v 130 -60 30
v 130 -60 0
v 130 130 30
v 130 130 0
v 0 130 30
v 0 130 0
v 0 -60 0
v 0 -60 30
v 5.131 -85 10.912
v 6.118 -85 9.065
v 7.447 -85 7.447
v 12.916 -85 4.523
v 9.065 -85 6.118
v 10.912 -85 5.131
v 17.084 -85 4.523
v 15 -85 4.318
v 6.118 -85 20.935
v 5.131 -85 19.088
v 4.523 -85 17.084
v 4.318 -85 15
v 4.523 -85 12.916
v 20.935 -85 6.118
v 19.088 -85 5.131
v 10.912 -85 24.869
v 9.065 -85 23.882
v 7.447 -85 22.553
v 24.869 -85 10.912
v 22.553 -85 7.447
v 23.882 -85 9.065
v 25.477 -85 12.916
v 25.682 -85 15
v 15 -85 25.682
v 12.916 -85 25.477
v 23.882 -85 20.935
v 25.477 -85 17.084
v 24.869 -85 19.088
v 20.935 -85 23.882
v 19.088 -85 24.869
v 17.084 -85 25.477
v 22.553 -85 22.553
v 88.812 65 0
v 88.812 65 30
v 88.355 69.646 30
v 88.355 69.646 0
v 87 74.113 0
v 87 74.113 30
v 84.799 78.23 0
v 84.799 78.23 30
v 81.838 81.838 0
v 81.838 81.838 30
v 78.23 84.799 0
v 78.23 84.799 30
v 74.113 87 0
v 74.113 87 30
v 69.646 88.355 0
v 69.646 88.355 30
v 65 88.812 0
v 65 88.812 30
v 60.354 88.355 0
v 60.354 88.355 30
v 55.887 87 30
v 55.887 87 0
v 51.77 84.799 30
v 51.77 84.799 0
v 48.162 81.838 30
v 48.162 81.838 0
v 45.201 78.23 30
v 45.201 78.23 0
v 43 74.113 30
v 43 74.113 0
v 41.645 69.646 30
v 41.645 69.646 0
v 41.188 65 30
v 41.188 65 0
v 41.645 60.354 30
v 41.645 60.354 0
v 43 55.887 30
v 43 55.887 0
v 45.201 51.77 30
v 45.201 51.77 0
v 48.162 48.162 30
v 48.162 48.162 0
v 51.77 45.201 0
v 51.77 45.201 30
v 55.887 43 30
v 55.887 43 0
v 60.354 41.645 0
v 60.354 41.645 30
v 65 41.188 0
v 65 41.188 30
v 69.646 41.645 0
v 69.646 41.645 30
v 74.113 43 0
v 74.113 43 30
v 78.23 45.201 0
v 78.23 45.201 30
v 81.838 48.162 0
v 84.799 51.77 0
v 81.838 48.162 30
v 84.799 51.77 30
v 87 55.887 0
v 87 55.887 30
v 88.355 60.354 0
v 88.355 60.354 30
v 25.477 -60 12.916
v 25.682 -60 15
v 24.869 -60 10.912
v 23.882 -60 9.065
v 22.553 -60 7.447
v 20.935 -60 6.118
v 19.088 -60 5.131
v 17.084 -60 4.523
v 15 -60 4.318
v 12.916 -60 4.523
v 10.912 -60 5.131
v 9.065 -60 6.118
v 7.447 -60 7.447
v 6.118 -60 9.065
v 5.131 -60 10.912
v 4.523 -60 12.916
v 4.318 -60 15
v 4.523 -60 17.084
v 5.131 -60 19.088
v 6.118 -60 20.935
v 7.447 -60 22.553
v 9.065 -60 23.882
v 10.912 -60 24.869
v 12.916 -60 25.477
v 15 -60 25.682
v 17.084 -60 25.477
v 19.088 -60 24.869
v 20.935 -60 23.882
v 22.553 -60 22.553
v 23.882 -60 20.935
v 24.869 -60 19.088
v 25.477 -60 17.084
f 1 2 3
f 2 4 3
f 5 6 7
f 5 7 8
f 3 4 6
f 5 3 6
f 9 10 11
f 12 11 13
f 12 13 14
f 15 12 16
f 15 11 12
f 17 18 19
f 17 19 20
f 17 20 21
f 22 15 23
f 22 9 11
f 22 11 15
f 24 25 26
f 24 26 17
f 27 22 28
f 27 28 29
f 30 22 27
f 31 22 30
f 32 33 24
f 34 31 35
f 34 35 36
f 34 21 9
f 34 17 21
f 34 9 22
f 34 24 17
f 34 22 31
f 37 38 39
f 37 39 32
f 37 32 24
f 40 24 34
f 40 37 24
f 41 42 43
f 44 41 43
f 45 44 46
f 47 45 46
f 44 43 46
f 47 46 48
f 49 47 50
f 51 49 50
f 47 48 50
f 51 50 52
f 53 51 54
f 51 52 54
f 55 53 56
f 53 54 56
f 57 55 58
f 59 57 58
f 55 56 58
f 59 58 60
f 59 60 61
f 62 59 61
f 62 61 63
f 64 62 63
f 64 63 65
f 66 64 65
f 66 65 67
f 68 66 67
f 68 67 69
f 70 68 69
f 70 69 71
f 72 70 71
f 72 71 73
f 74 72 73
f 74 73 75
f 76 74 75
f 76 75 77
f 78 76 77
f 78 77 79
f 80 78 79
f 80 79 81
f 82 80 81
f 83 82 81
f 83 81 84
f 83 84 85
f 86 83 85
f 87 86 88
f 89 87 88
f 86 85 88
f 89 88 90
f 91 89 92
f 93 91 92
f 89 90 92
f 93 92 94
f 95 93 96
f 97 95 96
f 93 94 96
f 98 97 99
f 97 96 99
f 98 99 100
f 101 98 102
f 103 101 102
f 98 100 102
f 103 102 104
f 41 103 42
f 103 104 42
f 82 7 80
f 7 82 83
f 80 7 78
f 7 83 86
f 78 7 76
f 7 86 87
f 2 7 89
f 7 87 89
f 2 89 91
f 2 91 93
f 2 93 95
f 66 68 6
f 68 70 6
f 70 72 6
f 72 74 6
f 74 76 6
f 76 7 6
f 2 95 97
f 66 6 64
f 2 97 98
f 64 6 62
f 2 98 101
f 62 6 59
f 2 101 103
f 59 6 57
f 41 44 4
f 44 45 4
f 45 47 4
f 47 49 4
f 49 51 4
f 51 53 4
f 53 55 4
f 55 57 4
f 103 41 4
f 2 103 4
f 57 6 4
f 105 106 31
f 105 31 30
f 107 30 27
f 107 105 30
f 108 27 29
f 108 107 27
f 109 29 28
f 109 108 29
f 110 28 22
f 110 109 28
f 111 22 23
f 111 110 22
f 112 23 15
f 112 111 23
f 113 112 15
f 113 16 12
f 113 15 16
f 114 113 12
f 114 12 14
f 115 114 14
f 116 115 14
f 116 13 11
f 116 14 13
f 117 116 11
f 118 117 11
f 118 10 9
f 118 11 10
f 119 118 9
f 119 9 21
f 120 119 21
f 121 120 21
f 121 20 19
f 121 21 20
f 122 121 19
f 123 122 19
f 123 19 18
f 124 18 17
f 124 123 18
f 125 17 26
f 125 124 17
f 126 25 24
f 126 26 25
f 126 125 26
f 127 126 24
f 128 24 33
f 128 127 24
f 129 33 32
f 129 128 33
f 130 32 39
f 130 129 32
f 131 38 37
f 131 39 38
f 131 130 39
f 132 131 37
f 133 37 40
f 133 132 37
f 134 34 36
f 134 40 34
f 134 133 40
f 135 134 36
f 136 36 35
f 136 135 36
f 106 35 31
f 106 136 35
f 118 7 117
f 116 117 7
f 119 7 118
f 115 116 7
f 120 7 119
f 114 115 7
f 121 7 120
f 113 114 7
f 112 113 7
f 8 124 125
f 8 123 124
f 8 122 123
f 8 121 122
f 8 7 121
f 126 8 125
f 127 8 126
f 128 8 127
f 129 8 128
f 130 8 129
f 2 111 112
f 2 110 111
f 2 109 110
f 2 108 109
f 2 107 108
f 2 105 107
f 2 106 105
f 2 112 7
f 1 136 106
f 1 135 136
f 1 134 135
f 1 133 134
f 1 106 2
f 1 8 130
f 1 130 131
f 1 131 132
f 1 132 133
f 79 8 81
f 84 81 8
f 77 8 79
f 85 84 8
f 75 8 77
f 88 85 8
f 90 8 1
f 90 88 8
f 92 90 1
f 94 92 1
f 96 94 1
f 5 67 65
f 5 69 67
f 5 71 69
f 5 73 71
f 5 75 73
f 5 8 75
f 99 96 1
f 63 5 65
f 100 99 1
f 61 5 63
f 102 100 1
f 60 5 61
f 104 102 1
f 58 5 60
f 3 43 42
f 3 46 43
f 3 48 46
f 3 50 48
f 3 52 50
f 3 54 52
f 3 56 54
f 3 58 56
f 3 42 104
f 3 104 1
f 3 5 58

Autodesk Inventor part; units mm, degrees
ref_plane "YZ Plane" through (0, 0, 0) normal (1, 0, 0) x (0, 1, 0)
ref_plane "XZ Plane" through (0, 0, 0) normal (0, 1, 0) x (-1, 0, 0)
ref_plane "XY Plane" through (0, 0, 0) normal (0, 0, 1) x (1, 0, 0)
sketch "Sketch9" plane through (0, 0, 0) normal (0, 0, 1) x (1, 0, 0)
  line L0 (0, 0) -> (130, 0)
  line L1 (130, 0) -> (130, 130)
  line L2 (130, 130) -> (0, 130)
  line L3 (0, 130) -> (0, 0)
  dimension "d32" = 130
  dimension "d33" = 130
extrude "Extrusion9" add sketch "Sketch9" along normal blind 30
sketch "Sketch10" plane through (0, 0, 30) normal (0, 0, 1) x (1, 0, 0)
  line L0 (0, 130) -> (0, 0) projected
  line L1 (130, 0) -> (130, 130) projected
  line L2 (0, 130) -> (130, 0) construction
  circle A0 centre (65, 65) radius 23.8125
  dimension "d36" = 47.625
extrude "Extrusion10" cut sketch "Sketch10" against normal blind 40
sketch "Sketch11" plane through (0, 0, 0) normal (-1, 0, 0) x (0, 0, 1)
  point P0 (0, 0)
sketch "Sketch12" plane through (0, 0, 0) normal (0, -1, 0) x (1, 0, 0)
  line L0 (130, 0) -> (130, 30) projected
  line L1 (0, 0) -> (130, 0)
  line L2 (130, 0) -> (130, 30)
  line L3 (130, 30) -> (0, 30)
  line L4 (0, 30) -> (0, 0)
extrude "Extrusion11" add sketch "Sketch12" along normal blind 40
sketch "Sketch13" plane through (0, -40, 0) normal (0, -1, 0) x (1, 0, 0)
  line L0 (130, 30) -> (0, 30) projected
  line L1 (0, 0) -> (130, 0)
  line L2 (130, 0) -> (130, 30)
  line L3 (130, 30) -> (0, 30)
  line L4 (0, 30) -> (0, 0)
  point P0 (0, 30)
extrude "Extrusion12" cut sketch "Sketch13" against normal blind 20
sketch "Sketch15" plane through (0, -20, 0) normal (0, -1, 0) x (1, 0, 0)
  line L0 (130, 30) -> (0, 30) projected
  line L1 (130, 30) -> (0, 30)
  line L2 (0, 30) -> (0, 0)
  line L3 (0, 0) -> (130, 0)
  line L4 (130, 0) -> (130, 30)
  point P0 (0, 30)
extrude "Extrusion14" add sketch "Sketch15" along normal blind 40
sketch "Sketch16" plane through (0, -60, 0) normal (0, -1, 0) x (1, 0, 0)
  line L0 (130, 30) -> (0, 30) projected
  line L1 (130, 30) -> (0, 30)
  line L2 (0, 30) -> (0, 0)
  line L3 (0, 0) -> (130, 0)
  line L4 (130, 0) -> (130, 30)
extrude "Extrusion15" cut sketch "Sketch16" against normal blind 15
sketch "Sketch17" plane through (0, -45, 0) normal (0, -1, 0) x (1, 0, 0)
  line L0 (130, 30) -> (0, 30) projected
  line L1 (130, 30) -> (0, 30)
  line L2 (0, 30) -> (0, 0)
  line L3 (0, 0) -> (130, 0)
  line L4 (130, 0) -> (130, 30)
extrude "Extrusion16" cut sketch "Sketch17" against normal blind 10
sketch "Sketch19" plane through (0, -35, 0) normal (0, -1, 0) x (1, 0, 0)
  circle A0 centre (25, 15) radius 10.682
  line L0 (0, 30) -> (130, 30) projected
  line L1 (0, 0) -> (0, 30) projected
  dimension "d64" = 21.364
  dimension "d65" = 15
  dimension "d66" = 25
extrude "Extrusion18" add sketch "Sketch19" along normal blind 15
sketch "Sketch20" plane through (0, -35, 0) normal (0, -1, 0) x (1, 0, 0)
  line L0 (0, 0) -> (0, 30) projected
  line L1 (0, 30) -> (130, 30) projected
  line L2 (0, 0) -> (130, 0)
  line L3 (130, 0) -> (130, 30)
  line L4 (130, 30) -> (0, 30)
  line L5 (0, 30) -> (0, 0)
extrude "Extrusion19" add sketch "Sketch20" along normal blind 25
sketch "Sketch21" plane through (0, -60, 0) normal (0, -1, 0) x (1, 0, 0)
  circle A0 centre (15, 15) radius 10.682
  line L0 (130, 30) -> (0, 30) projected
  line L1 (0, 30) -> (0, 0) projected
  dimension "d71" = 21.364
  dimension "d72" = 15
  dimension "d73" = 15
extrude "Extrusion20" add sketch "Sketch21" along normal blind 25
properties part number "Spring connection"
